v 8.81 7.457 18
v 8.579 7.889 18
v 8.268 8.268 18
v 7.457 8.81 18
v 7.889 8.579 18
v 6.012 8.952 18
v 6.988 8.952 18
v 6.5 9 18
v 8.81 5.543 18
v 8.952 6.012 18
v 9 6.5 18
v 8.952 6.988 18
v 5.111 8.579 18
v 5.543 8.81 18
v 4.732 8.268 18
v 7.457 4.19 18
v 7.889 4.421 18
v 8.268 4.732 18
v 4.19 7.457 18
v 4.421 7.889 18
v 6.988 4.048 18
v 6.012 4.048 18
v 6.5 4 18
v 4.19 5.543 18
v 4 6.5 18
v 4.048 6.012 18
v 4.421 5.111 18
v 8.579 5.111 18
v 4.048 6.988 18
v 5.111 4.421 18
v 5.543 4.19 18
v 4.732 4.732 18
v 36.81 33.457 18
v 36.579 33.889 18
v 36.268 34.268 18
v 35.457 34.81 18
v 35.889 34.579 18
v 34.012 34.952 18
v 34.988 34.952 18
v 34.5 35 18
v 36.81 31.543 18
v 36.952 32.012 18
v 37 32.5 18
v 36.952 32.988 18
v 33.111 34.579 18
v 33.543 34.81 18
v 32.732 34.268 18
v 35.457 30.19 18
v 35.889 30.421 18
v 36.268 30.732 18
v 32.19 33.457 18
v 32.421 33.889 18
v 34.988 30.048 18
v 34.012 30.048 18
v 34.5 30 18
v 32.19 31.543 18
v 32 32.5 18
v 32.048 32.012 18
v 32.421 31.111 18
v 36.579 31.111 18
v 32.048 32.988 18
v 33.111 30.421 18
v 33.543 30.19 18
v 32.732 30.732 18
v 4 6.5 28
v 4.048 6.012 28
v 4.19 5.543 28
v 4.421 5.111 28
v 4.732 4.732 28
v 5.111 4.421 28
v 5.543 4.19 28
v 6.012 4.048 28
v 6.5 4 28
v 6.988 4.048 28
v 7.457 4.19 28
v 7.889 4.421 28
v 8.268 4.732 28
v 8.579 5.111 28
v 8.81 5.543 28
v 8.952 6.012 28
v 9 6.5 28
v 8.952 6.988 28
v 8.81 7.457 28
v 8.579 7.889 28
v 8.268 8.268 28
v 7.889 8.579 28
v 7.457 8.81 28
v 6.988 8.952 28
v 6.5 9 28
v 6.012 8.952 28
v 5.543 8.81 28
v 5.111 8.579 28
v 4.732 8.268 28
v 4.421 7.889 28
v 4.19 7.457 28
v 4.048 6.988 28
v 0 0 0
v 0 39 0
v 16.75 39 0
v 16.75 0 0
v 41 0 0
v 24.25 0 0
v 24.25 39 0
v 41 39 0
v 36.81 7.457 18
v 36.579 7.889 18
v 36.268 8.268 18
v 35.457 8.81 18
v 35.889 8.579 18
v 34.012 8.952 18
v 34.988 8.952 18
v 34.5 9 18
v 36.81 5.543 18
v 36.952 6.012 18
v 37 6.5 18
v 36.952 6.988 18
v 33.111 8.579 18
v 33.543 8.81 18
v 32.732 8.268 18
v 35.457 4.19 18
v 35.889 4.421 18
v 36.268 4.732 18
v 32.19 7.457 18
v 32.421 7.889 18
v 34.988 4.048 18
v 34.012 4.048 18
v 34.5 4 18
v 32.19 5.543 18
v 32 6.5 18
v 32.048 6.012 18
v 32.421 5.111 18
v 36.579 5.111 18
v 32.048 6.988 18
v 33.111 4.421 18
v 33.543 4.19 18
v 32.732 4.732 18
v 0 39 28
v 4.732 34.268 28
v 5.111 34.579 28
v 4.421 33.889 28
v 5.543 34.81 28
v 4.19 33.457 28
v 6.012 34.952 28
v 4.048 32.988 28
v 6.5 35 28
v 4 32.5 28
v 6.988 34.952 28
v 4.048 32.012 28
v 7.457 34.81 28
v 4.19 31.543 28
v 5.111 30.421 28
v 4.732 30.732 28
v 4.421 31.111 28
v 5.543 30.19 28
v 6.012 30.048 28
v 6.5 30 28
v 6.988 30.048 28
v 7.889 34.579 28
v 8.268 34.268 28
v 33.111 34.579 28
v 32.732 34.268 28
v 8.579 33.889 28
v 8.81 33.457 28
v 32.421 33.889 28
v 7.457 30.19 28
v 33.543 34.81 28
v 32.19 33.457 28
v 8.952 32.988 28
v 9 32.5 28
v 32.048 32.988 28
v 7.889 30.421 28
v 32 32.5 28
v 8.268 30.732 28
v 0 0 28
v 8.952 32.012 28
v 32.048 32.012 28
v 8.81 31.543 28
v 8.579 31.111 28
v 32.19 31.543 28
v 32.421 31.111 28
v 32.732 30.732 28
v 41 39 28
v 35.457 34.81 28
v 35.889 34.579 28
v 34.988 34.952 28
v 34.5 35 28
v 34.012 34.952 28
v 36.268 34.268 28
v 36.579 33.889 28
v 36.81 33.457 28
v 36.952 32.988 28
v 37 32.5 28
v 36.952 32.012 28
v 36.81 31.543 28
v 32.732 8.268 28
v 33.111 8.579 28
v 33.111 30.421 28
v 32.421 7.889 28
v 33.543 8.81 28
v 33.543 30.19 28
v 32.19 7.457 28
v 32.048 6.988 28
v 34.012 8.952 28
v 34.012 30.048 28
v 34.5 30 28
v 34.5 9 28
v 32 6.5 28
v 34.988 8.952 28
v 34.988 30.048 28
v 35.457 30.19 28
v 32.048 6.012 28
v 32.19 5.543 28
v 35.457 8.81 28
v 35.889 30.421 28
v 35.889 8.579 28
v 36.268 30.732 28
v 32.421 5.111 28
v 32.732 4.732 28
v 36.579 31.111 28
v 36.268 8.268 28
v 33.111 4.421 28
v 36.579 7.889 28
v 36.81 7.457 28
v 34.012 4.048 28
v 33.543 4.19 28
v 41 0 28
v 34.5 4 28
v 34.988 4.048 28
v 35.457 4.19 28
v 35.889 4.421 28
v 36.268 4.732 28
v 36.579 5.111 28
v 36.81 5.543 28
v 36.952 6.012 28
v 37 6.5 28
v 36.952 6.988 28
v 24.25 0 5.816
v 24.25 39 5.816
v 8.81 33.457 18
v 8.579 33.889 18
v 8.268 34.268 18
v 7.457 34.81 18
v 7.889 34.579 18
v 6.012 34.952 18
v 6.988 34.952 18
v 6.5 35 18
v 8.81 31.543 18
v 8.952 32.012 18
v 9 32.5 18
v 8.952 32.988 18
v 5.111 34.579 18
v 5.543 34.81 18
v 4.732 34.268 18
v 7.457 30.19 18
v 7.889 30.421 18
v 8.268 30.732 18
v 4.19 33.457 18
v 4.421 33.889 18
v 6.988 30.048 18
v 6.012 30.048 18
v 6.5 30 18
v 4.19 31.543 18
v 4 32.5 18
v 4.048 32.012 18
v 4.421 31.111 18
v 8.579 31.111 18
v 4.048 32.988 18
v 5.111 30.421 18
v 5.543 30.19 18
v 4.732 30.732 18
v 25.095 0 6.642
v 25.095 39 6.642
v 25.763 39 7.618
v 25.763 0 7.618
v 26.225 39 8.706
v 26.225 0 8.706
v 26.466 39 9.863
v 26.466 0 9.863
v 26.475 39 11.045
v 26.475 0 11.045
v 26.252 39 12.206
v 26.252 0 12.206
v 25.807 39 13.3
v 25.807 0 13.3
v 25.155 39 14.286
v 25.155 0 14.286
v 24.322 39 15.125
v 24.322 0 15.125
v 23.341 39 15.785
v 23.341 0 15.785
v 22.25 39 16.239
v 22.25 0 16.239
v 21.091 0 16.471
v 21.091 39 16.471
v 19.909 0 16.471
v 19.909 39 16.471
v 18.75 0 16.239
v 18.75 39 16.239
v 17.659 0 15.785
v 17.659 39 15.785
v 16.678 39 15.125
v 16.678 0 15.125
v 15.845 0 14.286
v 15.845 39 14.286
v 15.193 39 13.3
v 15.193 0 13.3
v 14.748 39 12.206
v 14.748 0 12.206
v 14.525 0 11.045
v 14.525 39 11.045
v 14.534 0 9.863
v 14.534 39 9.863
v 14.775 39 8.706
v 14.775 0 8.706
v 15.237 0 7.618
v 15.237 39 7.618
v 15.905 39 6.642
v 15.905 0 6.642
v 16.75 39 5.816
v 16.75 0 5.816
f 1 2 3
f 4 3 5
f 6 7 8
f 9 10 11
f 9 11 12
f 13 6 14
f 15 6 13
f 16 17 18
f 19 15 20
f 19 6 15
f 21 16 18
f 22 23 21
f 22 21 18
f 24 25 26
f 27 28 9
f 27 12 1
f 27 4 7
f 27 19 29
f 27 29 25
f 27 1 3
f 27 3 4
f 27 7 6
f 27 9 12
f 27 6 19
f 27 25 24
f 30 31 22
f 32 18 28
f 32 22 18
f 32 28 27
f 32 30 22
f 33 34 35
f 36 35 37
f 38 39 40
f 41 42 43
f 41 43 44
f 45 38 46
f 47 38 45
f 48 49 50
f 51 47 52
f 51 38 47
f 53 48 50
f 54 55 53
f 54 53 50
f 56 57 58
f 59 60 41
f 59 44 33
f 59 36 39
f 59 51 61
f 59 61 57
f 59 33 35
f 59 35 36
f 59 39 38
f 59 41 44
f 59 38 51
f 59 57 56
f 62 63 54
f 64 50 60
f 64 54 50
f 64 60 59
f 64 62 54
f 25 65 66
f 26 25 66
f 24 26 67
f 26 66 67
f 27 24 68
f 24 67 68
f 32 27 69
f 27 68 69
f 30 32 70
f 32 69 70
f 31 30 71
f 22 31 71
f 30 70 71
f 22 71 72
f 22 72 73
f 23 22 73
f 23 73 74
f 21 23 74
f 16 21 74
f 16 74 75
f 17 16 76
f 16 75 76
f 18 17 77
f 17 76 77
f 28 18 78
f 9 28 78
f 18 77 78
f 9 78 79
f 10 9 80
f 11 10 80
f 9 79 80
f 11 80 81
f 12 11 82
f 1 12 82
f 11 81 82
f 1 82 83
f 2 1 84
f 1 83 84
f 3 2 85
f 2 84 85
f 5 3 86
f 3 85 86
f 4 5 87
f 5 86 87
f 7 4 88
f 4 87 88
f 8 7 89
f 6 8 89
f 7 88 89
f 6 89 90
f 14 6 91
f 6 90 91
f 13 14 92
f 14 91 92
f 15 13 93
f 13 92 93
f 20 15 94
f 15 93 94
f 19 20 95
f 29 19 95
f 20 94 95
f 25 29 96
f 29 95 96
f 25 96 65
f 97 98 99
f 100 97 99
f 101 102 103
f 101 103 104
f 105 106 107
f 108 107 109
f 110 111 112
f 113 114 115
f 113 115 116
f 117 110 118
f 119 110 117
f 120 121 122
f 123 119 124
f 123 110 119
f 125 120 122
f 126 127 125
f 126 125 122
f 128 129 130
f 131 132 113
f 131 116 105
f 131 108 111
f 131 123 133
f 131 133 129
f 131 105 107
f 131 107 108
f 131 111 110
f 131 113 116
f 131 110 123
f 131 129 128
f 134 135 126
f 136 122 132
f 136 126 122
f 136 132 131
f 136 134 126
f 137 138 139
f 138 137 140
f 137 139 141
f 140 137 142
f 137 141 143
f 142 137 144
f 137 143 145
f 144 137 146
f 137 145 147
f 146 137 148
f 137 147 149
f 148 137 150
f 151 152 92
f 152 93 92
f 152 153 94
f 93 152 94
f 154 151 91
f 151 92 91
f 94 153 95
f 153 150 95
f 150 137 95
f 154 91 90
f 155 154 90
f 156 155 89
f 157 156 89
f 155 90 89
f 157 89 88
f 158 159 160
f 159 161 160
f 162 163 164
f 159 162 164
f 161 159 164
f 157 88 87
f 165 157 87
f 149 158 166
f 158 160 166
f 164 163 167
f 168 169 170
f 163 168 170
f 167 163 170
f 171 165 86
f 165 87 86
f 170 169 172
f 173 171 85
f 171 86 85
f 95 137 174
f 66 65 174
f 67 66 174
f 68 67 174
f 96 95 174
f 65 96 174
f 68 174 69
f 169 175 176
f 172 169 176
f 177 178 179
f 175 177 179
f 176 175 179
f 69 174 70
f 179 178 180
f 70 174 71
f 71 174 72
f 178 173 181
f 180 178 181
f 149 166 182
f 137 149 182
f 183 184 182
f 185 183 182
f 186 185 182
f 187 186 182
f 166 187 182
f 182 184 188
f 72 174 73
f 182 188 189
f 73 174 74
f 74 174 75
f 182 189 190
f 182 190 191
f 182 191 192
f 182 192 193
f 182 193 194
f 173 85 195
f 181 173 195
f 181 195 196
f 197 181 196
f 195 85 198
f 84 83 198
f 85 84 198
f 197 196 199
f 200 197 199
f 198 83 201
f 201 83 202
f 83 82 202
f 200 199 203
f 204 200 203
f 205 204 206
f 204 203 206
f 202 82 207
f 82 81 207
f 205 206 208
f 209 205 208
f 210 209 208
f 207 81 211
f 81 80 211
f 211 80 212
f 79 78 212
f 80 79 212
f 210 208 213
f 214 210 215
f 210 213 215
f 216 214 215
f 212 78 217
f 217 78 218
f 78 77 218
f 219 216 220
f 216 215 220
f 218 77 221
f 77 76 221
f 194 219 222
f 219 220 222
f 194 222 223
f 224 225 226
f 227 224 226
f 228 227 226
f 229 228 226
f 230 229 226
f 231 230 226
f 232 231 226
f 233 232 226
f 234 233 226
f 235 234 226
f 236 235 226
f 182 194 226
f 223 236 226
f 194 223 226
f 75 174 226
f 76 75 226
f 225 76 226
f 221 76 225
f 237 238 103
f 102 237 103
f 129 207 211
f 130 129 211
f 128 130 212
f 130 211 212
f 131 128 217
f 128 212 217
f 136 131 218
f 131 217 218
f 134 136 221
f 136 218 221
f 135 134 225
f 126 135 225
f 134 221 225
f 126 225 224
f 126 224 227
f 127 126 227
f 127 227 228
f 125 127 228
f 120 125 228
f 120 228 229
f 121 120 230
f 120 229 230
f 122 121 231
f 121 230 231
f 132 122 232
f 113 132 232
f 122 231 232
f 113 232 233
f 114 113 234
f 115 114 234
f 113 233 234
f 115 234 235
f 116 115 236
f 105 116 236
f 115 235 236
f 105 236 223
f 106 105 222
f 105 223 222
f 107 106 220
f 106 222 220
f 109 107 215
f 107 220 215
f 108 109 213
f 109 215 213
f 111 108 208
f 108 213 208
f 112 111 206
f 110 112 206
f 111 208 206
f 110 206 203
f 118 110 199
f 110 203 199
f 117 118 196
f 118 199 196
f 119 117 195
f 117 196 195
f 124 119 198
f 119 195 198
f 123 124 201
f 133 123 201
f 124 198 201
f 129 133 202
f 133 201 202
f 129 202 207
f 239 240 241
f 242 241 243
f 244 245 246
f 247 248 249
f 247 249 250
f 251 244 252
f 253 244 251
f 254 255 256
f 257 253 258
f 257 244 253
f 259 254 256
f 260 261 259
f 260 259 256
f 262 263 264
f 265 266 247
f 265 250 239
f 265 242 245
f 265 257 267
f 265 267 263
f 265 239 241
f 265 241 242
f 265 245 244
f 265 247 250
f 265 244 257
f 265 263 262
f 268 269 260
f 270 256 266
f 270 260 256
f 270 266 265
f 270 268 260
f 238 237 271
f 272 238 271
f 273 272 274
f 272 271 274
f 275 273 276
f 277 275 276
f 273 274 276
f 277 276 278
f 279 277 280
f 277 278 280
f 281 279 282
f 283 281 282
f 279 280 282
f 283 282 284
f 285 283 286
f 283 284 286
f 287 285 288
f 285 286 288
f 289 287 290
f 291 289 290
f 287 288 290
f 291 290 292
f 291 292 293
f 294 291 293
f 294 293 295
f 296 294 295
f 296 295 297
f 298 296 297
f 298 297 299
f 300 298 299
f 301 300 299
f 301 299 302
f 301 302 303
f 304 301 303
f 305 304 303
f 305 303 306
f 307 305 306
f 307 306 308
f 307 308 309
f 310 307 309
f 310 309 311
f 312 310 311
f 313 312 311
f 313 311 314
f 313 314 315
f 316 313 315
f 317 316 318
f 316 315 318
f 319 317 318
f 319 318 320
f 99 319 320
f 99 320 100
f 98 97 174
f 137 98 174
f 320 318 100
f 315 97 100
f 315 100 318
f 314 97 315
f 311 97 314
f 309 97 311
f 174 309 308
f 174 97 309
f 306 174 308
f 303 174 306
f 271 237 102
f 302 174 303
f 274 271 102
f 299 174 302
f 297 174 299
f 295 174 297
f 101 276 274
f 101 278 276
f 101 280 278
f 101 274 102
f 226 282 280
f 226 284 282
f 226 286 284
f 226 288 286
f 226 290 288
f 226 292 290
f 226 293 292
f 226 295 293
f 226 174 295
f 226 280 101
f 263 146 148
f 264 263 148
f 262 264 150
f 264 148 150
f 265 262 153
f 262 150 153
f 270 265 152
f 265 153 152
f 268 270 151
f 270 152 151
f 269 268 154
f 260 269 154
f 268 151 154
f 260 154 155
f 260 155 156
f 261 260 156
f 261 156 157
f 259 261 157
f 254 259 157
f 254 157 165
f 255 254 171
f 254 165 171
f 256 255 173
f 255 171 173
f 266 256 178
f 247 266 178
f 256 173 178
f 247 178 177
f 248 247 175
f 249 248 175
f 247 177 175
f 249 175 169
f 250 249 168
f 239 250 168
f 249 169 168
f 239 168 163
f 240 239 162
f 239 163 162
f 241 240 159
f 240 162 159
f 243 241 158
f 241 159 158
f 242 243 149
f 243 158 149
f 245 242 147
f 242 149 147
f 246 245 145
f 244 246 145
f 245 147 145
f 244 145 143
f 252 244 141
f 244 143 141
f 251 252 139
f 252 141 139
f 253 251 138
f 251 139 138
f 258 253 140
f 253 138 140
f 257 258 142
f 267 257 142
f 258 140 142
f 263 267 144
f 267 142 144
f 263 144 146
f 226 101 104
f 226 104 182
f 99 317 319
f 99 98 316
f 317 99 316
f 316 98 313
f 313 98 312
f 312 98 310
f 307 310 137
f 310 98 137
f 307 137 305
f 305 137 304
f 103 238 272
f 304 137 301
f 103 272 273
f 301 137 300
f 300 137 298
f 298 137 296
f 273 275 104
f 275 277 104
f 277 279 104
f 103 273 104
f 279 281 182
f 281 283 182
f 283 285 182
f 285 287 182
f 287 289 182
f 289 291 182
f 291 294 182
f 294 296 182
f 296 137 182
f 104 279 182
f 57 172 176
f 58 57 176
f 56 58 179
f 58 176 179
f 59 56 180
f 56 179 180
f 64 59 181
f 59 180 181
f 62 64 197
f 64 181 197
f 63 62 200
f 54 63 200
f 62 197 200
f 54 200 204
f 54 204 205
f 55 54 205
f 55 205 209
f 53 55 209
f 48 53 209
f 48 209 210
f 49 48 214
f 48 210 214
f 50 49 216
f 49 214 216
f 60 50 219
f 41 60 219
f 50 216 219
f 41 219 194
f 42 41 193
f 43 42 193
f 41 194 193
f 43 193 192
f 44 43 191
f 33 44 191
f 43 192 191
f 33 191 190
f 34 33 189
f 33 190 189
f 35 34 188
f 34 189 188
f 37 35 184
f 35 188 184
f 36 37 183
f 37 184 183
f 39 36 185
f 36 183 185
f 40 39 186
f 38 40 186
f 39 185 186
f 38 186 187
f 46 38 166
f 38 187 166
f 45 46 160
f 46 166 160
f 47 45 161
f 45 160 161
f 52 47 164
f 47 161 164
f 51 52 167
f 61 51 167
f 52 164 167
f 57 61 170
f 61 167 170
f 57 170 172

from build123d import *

# Parameters (mm, degrees)
SKETCH_W        = 41
SKETCH_H        = 28
PAD_DEPTH       = 39
POCKET_DEPTH    = 39.001
SKETCH002_R     = 2.5
POCKET001_DEPTH = 10


with BuildPart() as part:
    # Sketch → Pad (new body)
    with BuildSketch(Plane.XZ):
        with Locations((20.5, 14)):
            Rectangle(SKETCH_W, SKETCH_H)
    extrude(amount=-PAD_DEPTH)

    # Sketch001 → Pocket (cut, through all)
    with BuildSketch(Plane.XZ):
        with BuildLine():
            ThreePointArc((24.25, 5.816252), (20.5, 16.5), (16.75, 5.816252))
            Line((16.75, 5.816252), (16.75, 0))
            Line((16.75, 0), (24.25, 0))
            Line((24.25, 5.816252), (24.25, 0))
        make_face()
    extrude(amount=-POCKET_DEPTH, mode=Mode.SUBTRACT)

    # Sketch002 → Pocket001 (cut)
    with BuildSketch(Plane(origin=(0, 0, 28), x_dir=(-1, 0, 0), z_dir=(0, 0, 1))):
        with Locations((-34.5, -6.5)):
            Circle(SKETCH002_R)
        with Locations((-6.5, -6.5)):
            Circle(SKETCH002_R)
        with Locations((-34.5, -32.5)):
            Circle(SKETCH002_R)
        with Locations((-6.5, -32.5)):
            Circle(SKETCH002_R)
    extrude(amount=-POCKET001_DEPTH, mode=Mode.SUBTRACT)


solid = part.part
